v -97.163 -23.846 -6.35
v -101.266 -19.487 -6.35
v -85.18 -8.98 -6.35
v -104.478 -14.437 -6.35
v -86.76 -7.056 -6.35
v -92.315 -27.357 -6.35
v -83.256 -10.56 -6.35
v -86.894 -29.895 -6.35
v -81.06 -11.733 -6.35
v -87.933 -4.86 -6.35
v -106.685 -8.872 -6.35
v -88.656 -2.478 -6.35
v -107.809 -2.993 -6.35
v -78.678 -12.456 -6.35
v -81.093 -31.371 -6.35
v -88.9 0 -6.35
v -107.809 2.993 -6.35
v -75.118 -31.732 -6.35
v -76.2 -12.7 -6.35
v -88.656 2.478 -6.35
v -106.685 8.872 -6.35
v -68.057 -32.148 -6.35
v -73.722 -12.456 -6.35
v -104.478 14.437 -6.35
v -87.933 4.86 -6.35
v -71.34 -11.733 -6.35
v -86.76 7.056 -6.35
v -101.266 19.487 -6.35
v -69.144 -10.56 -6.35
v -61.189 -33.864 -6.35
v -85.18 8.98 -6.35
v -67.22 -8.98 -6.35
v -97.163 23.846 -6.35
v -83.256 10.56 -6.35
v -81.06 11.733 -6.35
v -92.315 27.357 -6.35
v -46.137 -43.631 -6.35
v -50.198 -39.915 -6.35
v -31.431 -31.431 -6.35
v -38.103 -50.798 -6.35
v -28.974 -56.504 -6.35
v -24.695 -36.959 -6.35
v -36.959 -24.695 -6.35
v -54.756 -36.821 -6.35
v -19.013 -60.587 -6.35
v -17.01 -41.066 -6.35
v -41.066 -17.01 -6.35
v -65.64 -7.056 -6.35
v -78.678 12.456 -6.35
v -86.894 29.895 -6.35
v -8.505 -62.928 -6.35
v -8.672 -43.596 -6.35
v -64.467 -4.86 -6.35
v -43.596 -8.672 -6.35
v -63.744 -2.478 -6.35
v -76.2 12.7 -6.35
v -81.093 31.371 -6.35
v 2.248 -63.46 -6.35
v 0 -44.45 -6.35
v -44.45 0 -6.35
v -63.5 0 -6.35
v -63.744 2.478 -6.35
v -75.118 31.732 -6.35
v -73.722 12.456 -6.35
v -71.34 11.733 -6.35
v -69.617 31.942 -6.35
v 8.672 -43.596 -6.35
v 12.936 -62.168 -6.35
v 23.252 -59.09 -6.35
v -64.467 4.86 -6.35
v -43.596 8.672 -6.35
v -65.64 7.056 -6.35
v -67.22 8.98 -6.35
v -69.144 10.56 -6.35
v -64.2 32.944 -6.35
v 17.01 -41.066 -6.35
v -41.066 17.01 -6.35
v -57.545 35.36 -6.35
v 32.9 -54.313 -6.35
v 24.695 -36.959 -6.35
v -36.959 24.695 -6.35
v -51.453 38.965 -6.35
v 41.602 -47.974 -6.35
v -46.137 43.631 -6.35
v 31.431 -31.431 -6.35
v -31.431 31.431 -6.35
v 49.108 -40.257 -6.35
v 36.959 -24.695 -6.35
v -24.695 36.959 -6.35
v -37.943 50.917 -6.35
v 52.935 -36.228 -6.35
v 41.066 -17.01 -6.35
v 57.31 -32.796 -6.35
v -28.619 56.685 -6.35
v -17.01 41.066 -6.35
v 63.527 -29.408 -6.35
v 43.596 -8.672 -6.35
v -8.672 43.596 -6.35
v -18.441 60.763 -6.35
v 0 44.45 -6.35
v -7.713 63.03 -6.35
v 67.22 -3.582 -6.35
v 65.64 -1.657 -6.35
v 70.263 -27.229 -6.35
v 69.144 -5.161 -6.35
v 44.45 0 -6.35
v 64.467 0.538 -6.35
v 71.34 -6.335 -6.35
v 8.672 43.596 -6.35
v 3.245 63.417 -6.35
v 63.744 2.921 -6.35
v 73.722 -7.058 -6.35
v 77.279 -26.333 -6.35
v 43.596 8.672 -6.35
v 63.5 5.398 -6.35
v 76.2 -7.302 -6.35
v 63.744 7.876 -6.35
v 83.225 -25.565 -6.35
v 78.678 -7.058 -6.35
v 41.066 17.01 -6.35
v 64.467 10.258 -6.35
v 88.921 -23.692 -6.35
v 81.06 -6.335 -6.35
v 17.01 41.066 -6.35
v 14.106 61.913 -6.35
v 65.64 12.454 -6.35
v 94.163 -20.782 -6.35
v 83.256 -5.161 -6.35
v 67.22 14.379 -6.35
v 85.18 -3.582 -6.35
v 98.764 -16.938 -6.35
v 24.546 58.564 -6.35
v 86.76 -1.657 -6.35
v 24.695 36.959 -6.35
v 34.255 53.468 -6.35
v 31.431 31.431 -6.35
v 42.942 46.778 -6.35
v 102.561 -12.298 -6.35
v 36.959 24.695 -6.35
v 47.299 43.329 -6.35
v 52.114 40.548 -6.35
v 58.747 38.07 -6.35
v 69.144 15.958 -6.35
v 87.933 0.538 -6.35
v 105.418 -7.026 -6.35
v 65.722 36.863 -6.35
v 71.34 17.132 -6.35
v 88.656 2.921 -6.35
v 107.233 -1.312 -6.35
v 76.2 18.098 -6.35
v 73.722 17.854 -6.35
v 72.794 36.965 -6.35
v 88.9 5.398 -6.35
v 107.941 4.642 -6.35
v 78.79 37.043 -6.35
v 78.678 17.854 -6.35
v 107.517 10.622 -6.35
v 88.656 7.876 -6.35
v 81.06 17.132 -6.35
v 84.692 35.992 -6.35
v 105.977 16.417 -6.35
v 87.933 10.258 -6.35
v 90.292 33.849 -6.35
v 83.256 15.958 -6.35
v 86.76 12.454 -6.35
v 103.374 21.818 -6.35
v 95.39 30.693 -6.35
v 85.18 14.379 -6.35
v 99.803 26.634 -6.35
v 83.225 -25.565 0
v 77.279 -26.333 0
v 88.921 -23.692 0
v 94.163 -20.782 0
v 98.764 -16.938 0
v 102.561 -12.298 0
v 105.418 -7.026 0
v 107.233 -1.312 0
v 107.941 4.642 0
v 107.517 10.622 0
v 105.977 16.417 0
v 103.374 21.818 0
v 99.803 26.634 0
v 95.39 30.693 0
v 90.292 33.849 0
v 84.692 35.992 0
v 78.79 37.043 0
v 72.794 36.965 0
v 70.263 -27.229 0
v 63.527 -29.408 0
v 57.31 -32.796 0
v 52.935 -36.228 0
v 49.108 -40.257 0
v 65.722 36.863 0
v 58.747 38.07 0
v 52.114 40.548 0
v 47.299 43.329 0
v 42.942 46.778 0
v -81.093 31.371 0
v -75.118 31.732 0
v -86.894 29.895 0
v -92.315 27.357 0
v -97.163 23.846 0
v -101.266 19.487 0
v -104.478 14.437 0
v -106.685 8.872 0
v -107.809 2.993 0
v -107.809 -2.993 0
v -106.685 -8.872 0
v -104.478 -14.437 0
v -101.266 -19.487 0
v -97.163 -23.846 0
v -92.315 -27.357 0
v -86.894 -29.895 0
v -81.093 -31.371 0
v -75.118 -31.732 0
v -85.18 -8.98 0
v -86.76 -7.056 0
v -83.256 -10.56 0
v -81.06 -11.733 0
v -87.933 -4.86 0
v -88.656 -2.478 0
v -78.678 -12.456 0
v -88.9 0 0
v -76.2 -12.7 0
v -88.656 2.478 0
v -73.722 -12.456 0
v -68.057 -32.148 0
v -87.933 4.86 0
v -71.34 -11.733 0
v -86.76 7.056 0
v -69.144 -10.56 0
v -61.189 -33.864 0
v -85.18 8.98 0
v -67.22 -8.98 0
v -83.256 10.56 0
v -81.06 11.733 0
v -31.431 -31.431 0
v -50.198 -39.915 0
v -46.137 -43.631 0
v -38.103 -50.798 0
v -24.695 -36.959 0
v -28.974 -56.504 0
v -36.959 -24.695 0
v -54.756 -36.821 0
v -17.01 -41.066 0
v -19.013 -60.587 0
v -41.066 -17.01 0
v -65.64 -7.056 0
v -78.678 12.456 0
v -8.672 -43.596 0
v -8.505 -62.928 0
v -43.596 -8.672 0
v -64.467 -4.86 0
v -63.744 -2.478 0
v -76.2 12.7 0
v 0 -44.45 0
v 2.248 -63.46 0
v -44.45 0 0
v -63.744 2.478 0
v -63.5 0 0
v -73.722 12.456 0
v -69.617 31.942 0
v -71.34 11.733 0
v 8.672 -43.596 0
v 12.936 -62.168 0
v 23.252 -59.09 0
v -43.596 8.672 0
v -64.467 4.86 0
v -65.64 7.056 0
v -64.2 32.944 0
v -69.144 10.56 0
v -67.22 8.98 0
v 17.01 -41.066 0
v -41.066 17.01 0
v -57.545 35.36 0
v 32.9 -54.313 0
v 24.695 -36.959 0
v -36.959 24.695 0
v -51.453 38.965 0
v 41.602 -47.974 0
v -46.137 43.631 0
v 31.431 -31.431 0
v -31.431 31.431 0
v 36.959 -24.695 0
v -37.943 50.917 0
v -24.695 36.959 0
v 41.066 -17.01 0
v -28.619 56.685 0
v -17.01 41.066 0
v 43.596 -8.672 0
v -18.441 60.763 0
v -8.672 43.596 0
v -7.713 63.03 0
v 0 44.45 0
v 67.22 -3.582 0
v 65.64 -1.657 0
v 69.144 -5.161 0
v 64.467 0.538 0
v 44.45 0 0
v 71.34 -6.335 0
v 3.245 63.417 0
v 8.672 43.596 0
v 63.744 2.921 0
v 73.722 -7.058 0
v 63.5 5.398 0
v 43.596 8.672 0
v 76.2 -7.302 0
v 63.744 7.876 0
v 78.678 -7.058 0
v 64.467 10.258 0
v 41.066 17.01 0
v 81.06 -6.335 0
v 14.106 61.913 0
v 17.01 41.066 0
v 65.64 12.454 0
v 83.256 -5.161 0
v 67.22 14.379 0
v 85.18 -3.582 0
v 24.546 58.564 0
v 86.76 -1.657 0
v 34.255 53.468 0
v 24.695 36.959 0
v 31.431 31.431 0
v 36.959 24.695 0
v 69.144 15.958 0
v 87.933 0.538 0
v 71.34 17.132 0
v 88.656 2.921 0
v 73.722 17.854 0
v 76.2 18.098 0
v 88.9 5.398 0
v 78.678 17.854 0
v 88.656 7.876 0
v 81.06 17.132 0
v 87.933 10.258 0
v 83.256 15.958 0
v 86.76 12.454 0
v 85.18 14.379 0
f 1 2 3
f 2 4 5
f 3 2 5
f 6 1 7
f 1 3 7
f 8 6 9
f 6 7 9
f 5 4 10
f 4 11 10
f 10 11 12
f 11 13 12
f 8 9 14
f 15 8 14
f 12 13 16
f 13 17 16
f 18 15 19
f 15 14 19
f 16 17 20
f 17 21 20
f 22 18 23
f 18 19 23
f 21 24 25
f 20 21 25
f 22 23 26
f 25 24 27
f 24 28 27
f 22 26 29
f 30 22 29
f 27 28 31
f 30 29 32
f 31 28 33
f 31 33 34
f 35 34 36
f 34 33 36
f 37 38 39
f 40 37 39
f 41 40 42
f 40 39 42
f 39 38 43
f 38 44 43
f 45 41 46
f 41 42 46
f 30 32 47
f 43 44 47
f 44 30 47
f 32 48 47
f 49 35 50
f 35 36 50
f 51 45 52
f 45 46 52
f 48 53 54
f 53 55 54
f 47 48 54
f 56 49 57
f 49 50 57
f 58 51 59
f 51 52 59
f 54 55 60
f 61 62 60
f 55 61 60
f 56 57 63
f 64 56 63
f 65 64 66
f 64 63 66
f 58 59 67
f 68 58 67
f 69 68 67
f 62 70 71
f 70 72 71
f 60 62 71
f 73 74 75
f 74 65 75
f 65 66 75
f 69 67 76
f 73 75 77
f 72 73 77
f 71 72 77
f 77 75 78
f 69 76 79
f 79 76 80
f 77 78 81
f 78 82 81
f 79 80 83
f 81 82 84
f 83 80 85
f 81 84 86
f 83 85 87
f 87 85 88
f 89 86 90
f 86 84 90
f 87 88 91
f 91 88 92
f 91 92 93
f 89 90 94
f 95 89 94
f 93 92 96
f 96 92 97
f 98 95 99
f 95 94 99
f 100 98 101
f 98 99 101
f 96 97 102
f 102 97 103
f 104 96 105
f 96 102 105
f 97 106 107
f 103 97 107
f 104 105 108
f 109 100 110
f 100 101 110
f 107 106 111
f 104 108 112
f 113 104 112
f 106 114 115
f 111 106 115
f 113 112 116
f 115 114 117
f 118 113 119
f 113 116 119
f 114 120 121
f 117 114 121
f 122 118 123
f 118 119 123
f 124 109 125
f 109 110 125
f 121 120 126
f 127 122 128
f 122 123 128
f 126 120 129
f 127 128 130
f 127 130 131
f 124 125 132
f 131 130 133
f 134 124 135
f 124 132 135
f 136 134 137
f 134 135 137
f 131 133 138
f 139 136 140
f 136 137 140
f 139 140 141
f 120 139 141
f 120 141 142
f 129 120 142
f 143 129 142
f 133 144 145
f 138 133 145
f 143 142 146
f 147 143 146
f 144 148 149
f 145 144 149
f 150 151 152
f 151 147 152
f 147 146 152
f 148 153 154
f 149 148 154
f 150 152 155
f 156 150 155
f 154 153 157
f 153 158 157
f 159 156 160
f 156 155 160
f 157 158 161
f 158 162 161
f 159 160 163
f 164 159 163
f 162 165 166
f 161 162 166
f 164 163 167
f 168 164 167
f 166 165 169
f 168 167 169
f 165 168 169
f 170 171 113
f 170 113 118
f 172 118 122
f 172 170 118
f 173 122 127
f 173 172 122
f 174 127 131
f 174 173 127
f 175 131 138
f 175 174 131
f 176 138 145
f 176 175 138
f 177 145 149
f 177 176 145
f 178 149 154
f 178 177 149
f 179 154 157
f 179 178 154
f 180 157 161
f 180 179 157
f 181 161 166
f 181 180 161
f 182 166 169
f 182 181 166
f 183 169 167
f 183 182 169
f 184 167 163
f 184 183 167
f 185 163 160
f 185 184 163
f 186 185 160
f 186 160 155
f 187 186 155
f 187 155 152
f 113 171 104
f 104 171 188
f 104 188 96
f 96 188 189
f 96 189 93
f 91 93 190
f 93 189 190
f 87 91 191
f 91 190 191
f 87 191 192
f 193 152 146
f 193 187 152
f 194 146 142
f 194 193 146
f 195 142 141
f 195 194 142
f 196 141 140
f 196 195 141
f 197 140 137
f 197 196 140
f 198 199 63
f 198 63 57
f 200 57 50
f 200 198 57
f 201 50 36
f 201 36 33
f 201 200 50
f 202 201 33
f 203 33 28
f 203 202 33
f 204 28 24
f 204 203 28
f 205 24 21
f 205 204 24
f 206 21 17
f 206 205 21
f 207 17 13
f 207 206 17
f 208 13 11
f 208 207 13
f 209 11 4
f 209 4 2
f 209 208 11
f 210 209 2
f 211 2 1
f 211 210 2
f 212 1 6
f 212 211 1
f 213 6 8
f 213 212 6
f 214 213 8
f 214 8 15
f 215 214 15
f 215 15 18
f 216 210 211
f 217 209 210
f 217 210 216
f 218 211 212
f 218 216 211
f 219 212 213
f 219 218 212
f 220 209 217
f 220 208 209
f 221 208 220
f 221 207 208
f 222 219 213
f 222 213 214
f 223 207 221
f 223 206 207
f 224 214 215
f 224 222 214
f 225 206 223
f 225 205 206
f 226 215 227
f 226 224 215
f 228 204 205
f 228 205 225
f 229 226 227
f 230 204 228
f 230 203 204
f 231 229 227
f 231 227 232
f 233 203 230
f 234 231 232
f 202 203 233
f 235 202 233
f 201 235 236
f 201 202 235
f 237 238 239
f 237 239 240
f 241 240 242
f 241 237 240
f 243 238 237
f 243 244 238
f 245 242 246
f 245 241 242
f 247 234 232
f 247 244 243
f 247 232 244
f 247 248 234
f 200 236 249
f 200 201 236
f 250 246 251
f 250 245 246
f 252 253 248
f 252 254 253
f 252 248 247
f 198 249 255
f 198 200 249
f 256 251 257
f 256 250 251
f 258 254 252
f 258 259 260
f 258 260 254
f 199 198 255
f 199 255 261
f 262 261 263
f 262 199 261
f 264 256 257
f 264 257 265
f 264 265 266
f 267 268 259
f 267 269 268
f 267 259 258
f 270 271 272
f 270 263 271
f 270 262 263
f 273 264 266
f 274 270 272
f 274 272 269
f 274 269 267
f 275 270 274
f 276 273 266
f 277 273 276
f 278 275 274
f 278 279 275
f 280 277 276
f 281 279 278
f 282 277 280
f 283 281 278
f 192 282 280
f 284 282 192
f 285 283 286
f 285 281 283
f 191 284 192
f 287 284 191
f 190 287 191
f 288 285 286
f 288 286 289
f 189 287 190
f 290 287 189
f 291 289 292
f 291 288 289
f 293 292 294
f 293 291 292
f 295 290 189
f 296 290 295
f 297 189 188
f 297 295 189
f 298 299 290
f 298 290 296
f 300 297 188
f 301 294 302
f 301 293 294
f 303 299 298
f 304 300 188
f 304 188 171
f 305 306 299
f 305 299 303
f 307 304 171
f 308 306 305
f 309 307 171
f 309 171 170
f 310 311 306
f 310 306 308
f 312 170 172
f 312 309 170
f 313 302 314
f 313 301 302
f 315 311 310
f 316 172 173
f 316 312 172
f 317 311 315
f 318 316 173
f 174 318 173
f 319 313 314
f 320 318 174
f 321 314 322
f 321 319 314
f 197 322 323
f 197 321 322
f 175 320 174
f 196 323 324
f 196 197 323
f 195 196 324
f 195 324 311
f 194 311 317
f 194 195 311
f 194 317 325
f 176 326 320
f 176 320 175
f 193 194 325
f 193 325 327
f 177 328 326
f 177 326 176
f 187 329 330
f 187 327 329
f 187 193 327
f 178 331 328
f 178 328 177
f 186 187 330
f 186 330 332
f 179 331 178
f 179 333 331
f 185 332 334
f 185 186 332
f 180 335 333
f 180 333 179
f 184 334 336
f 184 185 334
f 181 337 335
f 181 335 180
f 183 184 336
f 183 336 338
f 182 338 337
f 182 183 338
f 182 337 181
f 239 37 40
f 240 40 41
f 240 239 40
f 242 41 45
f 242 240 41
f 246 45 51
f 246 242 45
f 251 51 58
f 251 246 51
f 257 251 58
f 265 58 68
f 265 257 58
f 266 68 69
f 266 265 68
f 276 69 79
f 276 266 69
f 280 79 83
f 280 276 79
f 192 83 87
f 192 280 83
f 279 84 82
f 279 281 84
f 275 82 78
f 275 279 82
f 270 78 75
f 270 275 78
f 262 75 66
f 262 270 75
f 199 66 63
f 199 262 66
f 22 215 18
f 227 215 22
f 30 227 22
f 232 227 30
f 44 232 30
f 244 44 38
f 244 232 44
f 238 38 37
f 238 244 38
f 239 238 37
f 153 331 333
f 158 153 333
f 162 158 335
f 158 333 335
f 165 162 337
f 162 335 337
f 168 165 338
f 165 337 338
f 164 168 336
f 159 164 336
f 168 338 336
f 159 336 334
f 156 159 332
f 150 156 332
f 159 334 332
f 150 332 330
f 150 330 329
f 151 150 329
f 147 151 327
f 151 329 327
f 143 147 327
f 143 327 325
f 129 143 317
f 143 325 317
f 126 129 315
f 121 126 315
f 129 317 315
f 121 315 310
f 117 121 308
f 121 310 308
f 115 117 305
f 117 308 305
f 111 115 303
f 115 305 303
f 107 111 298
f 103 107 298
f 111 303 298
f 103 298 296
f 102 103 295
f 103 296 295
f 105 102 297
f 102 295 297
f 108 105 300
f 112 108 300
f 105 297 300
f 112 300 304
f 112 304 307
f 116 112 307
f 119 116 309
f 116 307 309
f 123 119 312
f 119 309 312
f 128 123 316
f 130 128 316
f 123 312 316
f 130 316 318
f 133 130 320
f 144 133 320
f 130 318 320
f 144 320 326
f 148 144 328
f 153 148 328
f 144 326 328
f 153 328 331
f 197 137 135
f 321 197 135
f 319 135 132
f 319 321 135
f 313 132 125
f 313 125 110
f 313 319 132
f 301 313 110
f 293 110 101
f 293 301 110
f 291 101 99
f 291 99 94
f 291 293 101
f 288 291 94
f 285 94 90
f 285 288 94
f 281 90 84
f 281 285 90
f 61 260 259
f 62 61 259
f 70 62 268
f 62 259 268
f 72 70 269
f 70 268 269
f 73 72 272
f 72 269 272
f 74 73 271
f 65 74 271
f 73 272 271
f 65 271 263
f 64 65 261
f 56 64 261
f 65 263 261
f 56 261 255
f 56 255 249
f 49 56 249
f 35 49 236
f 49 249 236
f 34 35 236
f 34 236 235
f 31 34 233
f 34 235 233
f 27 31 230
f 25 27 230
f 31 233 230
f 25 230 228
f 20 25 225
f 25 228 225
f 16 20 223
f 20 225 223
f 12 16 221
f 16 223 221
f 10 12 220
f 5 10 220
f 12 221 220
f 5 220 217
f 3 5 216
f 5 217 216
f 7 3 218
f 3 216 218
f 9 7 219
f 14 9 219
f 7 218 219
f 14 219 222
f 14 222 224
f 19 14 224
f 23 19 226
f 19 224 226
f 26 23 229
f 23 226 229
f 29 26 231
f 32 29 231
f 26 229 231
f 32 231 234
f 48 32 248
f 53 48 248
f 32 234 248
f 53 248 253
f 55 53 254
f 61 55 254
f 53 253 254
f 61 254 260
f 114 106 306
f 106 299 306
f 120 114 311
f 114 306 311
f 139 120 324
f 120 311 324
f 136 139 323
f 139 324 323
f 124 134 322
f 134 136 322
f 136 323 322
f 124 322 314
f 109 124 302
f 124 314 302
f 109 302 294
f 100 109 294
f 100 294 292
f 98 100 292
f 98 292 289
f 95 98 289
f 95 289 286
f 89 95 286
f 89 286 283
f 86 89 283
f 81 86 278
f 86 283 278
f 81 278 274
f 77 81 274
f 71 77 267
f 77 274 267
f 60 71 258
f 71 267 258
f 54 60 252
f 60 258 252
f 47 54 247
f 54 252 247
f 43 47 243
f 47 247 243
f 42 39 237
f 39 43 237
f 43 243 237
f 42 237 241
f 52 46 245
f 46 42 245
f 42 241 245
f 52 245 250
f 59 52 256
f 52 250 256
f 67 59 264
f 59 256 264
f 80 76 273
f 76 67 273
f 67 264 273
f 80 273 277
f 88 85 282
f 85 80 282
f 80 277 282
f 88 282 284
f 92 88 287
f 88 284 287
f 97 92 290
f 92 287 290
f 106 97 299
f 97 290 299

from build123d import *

# Parameters (mm, degrees)
F0_R     = 63.5
F0_R_2   = 44.45
F1_DEPTH = 6.35
F2_R     = 31.75
F2_R_2   = 12.7
F3_DEPTH = 6.35
F4_R     = 31.75
F4_R_2   = 12.7
F5_DEPTH = 6.35
F8_R     = 38.1


# Not quite as in the source:
# - two fillets or chamfers of one size are made in one step


with BuildPart() as f1:
    # F0 (on Top) → F1 (new body)
    with BuildSketch(Plane.XY):
        Circle(F0_R)
        Circle(F0_R_2, mode=Mode.SUBTRACT)
    extrude(amount=-F1_DEPTH)

    # F2 (on Top) → F3 (join)
    with BuildSketch(Plane.XY):
        with Locations((-76.2, 0)):
            Circle(F2_R)
        with Locations((-76.2, 0)):
            Circle(F2_R_2, mode=Mode.SUBTRACT)
    extrude(amount=-F3_DEPTH)

    # F4 (on Top) → F5 (join)
    with BuildSketch(Plane.XY):
        with Locations((76.2, 5.3983563557)):
            Circle(F4_R)
        with Locations((76.2, 5.3983563557)):
            Circle(F4_R_2, mode=Mode.SUBTRACT)
    extrude(amount=-F5_DEPTH)

    # F6: union 

    # F7: union 

    # F8
    f8_edges = [f1.edges().sort_by_distance(p)[0] for p in [
        (-57.94375, 25.976371, -3.175),
        (56.016218, 29.907078, -3.175),
        (59.673087, -21.711119, -3.175),
        (-57.94375, -25.976371, -3.175),
    ]]
    fillet(f8_edges, radius=F8_R)


solid = f1.part
